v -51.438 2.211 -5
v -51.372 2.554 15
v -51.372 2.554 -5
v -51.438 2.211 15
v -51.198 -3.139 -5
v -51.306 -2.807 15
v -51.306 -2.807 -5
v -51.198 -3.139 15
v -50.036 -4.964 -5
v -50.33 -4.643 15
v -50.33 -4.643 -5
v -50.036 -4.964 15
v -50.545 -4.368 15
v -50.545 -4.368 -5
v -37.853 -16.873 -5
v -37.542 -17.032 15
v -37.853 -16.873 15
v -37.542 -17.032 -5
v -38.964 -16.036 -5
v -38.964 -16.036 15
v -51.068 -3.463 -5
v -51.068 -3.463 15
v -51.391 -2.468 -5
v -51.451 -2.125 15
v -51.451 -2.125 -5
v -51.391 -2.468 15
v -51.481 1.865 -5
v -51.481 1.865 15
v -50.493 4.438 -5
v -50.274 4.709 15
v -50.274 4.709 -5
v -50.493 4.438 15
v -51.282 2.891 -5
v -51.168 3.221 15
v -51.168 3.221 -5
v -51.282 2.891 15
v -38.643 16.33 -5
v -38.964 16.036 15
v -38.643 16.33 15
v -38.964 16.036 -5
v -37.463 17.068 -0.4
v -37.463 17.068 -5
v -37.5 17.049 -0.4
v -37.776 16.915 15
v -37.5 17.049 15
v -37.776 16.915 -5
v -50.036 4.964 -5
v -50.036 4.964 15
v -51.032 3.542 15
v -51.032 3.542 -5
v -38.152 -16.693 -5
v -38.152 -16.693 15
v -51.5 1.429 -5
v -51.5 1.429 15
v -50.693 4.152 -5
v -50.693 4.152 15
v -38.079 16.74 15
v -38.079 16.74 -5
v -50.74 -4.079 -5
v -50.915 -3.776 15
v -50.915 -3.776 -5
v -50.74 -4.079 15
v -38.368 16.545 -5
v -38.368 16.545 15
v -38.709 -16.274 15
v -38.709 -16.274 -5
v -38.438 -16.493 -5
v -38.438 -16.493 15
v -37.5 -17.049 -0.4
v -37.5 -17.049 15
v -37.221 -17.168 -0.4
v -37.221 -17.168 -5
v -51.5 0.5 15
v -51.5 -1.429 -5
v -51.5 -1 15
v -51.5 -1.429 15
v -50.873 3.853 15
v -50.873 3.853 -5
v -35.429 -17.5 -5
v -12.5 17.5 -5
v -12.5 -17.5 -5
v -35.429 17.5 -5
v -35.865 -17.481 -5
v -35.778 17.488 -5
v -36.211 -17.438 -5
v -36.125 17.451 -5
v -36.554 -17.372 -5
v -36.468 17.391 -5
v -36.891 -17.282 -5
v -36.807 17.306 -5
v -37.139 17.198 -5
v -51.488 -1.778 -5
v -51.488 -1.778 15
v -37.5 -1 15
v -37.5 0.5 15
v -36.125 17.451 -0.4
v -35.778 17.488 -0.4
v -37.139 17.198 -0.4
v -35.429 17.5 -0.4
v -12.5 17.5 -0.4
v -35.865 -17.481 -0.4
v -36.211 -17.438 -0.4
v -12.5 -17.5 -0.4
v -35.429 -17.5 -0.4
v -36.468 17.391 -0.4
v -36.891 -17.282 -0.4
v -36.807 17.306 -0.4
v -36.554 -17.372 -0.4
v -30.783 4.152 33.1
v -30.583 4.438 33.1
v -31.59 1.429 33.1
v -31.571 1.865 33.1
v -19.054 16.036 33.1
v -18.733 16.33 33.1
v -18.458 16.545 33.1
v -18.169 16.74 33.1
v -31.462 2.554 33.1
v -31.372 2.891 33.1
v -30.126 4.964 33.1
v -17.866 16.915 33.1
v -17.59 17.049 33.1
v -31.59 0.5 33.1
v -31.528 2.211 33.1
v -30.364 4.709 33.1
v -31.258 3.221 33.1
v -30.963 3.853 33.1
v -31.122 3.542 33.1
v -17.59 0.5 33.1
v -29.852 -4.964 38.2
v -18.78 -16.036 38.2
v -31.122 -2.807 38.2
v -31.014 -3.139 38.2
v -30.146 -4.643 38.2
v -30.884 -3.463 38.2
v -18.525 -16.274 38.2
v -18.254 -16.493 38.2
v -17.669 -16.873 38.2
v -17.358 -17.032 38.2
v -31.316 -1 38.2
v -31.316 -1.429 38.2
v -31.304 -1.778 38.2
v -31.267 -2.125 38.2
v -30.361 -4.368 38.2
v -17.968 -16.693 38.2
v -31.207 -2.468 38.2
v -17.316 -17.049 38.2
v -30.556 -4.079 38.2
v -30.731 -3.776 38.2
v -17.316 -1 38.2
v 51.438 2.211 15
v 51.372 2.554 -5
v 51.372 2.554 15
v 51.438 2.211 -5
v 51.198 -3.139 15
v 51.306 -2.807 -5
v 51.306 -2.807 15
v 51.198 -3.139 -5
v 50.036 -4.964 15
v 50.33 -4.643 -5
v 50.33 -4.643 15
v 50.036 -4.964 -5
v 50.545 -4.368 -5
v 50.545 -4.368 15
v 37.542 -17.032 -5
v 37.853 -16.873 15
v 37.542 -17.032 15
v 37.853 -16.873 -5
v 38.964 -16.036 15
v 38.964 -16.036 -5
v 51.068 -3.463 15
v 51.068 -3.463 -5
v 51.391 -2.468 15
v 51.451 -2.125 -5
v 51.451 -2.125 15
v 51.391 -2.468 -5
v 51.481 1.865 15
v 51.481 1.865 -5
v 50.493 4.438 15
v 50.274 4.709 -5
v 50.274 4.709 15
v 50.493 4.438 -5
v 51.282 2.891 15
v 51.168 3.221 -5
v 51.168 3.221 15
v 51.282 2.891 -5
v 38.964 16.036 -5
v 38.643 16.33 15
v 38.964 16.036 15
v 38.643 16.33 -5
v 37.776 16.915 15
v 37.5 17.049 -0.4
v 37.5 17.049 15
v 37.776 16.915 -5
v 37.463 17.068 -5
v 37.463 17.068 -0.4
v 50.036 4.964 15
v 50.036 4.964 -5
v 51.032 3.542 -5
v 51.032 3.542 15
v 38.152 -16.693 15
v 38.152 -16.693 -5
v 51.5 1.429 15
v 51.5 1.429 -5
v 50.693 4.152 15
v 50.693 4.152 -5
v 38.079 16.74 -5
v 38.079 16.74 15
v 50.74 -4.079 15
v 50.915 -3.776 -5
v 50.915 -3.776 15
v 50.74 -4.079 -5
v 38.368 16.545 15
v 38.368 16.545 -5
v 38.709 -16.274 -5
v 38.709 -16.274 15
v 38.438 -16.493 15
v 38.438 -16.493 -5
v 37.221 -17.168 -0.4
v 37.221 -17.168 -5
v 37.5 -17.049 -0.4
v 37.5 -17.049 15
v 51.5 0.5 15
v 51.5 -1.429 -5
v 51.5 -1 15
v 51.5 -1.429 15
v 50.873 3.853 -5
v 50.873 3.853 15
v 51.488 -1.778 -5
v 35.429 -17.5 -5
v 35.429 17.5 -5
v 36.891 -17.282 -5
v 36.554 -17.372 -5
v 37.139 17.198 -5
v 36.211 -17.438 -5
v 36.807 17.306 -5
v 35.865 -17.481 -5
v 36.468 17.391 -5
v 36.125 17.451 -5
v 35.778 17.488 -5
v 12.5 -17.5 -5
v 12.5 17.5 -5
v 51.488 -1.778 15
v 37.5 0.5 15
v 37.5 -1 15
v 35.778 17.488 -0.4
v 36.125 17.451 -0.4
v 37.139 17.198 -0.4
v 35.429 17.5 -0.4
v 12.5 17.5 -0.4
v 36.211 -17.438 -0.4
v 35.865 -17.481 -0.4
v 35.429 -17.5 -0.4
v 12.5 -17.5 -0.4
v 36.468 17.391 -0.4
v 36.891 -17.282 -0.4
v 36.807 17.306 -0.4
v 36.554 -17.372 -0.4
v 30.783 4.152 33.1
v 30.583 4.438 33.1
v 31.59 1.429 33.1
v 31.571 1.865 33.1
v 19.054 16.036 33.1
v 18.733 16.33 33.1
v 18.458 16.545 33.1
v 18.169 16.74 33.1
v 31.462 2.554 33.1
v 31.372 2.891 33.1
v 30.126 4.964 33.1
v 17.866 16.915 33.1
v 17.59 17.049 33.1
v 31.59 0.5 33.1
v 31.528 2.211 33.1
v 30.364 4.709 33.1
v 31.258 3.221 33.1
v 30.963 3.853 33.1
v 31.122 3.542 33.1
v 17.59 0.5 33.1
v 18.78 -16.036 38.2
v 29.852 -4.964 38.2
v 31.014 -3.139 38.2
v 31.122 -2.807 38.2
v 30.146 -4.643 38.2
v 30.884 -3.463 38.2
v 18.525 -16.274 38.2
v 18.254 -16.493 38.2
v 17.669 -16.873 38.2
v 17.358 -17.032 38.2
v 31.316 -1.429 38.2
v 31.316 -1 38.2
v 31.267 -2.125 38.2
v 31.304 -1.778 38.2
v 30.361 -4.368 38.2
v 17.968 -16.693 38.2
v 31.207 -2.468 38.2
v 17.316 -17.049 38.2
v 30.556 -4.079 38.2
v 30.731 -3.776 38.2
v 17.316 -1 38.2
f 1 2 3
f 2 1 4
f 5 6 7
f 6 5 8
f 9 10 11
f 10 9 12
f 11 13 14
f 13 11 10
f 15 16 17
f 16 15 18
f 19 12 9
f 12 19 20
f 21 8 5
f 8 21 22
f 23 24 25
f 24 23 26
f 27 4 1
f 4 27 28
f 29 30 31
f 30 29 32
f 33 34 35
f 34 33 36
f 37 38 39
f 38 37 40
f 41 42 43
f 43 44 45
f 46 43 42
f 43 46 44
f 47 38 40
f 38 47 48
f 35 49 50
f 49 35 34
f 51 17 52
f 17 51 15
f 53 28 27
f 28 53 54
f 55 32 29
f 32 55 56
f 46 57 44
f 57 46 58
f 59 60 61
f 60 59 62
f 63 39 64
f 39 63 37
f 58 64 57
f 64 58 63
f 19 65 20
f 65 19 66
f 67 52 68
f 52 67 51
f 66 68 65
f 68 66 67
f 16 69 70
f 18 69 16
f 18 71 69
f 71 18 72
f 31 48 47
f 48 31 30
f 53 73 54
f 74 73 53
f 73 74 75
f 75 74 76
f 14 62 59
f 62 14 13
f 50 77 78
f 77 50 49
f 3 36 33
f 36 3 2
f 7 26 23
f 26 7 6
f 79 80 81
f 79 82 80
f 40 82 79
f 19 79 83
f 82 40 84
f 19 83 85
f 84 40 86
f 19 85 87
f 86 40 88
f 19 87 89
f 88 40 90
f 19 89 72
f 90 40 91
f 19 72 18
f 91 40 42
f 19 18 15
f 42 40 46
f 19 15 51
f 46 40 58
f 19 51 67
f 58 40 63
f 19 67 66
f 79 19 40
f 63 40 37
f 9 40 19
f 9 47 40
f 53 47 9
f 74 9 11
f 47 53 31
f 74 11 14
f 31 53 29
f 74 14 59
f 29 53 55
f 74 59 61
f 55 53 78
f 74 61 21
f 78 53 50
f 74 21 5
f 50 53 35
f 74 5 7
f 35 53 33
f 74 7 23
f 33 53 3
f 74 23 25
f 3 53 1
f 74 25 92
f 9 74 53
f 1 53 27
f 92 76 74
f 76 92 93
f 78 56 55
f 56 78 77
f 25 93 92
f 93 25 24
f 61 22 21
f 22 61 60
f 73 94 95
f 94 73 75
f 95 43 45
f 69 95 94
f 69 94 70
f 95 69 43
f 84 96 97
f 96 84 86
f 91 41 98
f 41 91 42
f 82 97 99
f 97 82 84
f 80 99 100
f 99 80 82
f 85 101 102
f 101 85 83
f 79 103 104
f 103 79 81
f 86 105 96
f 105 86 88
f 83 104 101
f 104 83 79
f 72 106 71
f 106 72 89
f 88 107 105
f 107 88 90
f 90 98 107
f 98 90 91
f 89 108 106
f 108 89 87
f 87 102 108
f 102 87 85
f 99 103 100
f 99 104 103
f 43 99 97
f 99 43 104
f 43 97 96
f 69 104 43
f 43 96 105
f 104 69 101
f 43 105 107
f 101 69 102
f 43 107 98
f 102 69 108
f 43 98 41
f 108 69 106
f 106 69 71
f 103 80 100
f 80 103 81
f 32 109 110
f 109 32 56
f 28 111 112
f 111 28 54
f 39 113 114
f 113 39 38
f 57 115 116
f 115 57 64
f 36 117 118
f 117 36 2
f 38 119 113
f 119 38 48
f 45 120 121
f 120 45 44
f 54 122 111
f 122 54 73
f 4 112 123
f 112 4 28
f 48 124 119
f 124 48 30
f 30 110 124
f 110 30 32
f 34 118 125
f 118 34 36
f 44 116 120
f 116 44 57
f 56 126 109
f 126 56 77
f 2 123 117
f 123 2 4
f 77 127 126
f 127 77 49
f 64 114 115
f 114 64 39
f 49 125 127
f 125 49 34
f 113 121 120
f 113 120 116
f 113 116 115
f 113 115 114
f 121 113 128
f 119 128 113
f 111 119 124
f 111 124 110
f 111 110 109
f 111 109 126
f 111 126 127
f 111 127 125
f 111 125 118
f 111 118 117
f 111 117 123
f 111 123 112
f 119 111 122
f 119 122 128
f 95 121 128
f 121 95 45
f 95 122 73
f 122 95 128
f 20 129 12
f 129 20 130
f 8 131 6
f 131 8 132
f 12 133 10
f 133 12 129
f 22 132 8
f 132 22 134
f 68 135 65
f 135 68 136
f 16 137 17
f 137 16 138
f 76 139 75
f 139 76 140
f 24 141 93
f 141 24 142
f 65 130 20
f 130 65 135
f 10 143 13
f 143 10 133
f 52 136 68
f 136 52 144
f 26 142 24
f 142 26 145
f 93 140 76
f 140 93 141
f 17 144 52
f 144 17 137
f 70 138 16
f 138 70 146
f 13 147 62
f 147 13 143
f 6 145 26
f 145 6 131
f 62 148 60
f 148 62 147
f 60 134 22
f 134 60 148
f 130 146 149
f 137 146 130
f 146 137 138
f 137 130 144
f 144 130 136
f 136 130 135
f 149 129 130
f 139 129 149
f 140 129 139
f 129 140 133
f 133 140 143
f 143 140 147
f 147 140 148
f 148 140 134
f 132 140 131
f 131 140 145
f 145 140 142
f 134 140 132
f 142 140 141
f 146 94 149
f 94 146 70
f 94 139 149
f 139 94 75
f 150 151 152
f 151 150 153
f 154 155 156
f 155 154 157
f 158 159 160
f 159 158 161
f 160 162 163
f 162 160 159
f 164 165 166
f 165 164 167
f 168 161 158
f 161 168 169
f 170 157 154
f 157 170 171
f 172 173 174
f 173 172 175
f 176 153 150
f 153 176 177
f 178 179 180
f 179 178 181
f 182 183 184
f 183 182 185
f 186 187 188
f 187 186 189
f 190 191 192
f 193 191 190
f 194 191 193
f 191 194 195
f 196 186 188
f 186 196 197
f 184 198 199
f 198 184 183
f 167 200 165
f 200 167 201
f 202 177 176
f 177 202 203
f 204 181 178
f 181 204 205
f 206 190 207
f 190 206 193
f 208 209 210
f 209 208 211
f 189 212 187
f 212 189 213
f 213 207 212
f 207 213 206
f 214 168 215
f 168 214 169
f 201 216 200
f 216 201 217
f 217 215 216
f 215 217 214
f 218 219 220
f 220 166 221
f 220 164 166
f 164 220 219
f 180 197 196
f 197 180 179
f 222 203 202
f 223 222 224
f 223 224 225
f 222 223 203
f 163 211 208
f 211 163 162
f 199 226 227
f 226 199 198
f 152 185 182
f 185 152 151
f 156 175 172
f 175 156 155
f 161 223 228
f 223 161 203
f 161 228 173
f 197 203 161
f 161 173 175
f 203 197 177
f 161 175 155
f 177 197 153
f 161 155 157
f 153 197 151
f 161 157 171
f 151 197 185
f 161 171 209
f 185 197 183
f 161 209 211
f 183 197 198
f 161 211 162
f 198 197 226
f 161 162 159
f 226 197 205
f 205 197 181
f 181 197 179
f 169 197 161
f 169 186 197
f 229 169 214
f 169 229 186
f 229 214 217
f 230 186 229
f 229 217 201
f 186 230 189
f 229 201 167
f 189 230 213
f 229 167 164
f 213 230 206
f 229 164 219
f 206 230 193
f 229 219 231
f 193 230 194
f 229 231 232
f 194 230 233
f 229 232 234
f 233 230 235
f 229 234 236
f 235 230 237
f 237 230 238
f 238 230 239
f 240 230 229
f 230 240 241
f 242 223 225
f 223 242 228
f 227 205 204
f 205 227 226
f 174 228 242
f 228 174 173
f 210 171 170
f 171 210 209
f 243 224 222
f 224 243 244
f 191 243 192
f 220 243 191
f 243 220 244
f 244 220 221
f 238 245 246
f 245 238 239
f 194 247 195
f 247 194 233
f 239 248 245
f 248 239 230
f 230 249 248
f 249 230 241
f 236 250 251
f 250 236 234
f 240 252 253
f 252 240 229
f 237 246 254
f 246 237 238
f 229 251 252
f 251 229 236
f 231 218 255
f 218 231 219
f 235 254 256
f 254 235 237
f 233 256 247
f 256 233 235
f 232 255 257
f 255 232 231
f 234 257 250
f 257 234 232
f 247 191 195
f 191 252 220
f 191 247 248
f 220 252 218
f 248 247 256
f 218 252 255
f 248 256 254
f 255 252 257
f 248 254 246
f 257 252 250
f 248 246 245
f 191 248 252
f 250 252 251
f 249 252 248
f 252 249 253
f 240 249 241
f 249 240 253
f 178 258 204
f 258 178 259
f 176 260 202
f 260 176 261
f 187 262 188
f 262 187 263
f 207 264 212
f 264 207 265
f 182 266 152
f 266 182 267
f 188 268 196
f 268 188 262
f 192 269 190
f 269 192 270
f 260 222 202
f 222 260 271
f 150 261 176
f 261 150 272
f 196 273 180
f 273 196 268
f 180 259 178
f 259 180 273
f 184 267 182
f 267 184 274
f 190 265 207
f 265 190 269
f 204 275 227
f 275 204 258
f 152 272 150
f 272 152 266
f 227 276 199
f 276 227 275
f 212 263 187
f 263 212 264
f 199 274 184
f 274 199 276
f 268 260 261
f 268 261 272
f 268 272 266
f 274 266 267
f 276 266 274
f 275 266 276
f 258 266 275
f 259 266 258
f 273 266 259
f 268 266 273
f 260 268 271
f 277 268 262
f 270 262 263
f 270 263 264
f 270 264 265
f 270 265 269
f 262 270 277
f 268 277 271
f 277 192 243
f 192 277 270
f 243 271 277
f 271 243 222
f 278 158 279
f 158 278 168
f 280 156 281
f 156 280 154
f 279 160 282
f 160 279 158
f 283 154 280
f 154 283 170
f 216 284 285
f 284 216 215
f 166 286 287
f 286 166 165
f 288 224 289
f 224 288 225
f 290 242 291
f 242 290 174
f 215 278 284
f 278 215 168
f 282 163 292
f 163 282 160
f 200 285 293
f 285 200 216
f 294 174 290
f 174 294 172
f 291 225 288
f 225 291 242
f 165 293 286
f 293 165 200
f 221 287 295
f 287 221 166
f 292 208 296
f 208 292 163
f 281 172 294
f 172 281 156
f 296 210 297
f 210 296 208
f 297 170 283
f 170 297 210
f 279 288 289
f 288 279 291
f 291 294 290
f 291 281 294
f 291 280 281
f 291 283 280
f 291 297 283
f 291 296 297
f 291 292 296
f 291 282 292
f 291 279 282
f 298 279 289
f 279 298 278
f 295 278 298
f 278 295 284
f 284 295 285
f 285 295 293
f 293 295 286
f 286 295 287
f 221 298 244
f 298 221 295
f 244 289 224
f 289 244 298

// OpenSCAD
// OpenSCAD file for hypercube parts.
// Copyright by Piotr Stachura <pstachura2012@gmail.com>

// M3 nut: head: 5.4mm, rod: 2.93mm
// M3 square: 5.44x1.7
// M3 hexagon: 5.44, 6.2x2.46

square_nut_add = 0.4;

//%import("Y_Carriage_xDia8_LM10UU_1.0.stl");

$fn=90;

module support_low() {
   translate([0,0,-5])
   multmatrix(m = [[1, 0, 0, -20],
                   [0, 1, 0, 0],
                   [0, 0, 1, 0],
                   [0, 0, 0, 1]]) difference() {
      linear_extrude(20) offset(r=5) offset(r=-5)
         polygon([[-17.5,-17.5],[17.5,-17.5],[31.5,-3.5],[31.5,3.5],
                  [17.5,17.5],[-17.5,17.5],[-31.5,3.5],[-31.5,-3.5]]);
      translate([-17.5,-35,-1]) cube([60,70,100],false);
   }
   difference() {
      translate([-20,0,-5]) linear_extrude(4.6) offset(r=5) offset(r=-5)
         polygon([[-17.5,-17.5],[17.5,-17.5],[31.5,-3.5],[31.5,3.5],
                  [17.5,17.5],[-17.5,17.5],[-31.5,3.5],[-31.5,-3.5]]);
      translate([-12.5,-35,-6]) cube([60,70,100],false);
   }
}

module support_high1() {
   multmatrix(m = [[1, 0, 1.1, -20],
                   [0, 1, 0, 0],
                   [0, 0, 1, 15],
                   [0, 0, 0, 1]]) difference() {
      linear_extrude(18.5-0.4) offset(r=5) offset(r=-5)
         polygon([[-17.5,-17.5],[17.5,-17.5],[31.5,-3.5],[31.5,3.5],
                  [17.5,17.5],[-17.5,17.5],[-31.5,3.5],[-31.5,-3.5]]);
      translate([-17.5,-35,-1]) cube([60,70,100],false);
      translate([-50,-69.5,-1]) cube([60,70,100],false);
   }
}

module support_high2() {
   multmatrix(m = [[1, 0, 0.87, -20],
                   [0, 1, 0, 0],
                   [0, 0, 1, 15],
                   [0, 0, 0, 1]]) difference() {
      linear_extrude(23.6-0.4) offset(r=5) offset(r=-5)
         polygon([[-17.5,-17.5],[17.5,-17.5],[31.5,-3.5],[31.5,3.5],
                  [17.5,17.5],[-17.5,17.5],[-31.5,3.5],[-31.5,-3.5]]);
      translate([-17.5,-35,-1]) cube([60,70,100],false);
      translate([-50,-1,-1]) cube([60,70,100],false);
   }
}

module y_carriage_base() {
   difference() {
      union() {
         // body
        rotate([90,0,0]) cylinder(d=23,h=35,center=true);
         difference() {
            linear_extrude(45) offset(r=5) offset(r=-5)
               polygon([[-17.5,-17.5],[17.5,-17.5],[31.5,-3.5],[31.5,3.5],
                  [17.5,17.5],[-17.5,17.5],[-31.5,3.5],[-31.5,-3.5]]);
            translate([0,0,18]) linear_extrude(45-18-6.5-5) offset(r=5.5) offset(r=-5)
               polygon([[-17.5,-17.5],[17.5,-17.5],[31.5,-3.5],[31.5,3.5],
                  [17.5,17.5],[-17.5,17.5],[-31.5,3.5],[-31.5,-3.5]]);
            translate([0,0,18]) linear_extrude(45-18-6.5) offset(r=5.5) offset(r=-5)
               polygon([[-40,-17.5],[40,-17.5],[40,0],[-40,0]]);
            translate([0,0,-0.1]) linear_extrude(46)
               polygon([[11.5,17.51],[18.25,17.51],[18.25,9.85],
                  [24,4.1],[21.9,4.1],[16.5,9.5],[11.5,9.5]]);
            mirror([1,0,0]) translate([0,0,-0.1]) linear_extrude(46)
               polygon([[11.5,17.51],[18.25,17.51],[18.25,9.85],
                  [24,4.1],[21.9,4.1],[16.5,9.5],[11.5,9.5]]);
         }
         translate([0,0,0]) linear_extrude(45) offset(r=2) offset(r=-2)
            polygon([[-12.5,-17.5],[12.5,-17.5],[16.5,-13.5],[16.5,17.5],[-16.5,17.5],[-16.5,-13.5]]);
      }
      // low cut
      translate([0,0,-10-5]) cube([100,100,20],true);
      // y belt
      translate([-5.5,0,15.25]) cube([9,40,5.5],true);
      // y rail
      rotate([0,0,90]) for(y=[0]) {
         translate([-28,y,0]) rotate([0,90,0]) cylinder(d=19.2-0.6,h=56,center=false);
         translate([-28,y,0]) rotate([0,90,0]) cylinder(d=19.2,h=17.3,center=false);
         translate([-9.9,y,0]) rotate([0,90,0]) cylinder(d=19.2,h=19.8,center=false);
         translate([10.7,y,0]) rotate([0,90,0]) cylinder(d=19.2,h=17.3,center=false);
      }
//      translate([0,0,-0.5]) rotate([90,0,0]) cylinder(d=20,h=40,center=true);
      // x rails
      for(x_pos = [-22.5,22.5]) {
         translate([x_pos,0,0]) cylinder(d=10.2,h=100,center=true);
      }
      // xy belt1
      intersection() {
         translate([-11,0,0]) rotate([-90,180,-90]) linear_extrude(12)
            offset(r=9.75) offset(r=-9.75)
               polygon([[-30,25.25],[3.6,25.25],[3.6,100],[-30,100]]);
         union() {
            translate([-11,-30,25.25]) cube([11,34,30],false);
            translate([-0.1,-10.45,31]) cube([0.9,34,30],false);
            translate([-0.1,-3.65,25.25]) cube([0.9,10,30],false);
         }
      }
      // xy belt2
      intersection() {
         translate([0,0,0]) rotate([-90,180,-90]) linear_extrude(11)
            offset(r=9.75) offset(r=-9.75)
               polygon([[-3.65,12.5],[40,12.5],[40,100],[-3.65,100]]);
         union() {
            translate([0,-3.65,12.5]) cube([11,7.25,40],false);
            translate([0,-3.65,12.5]) cube([11,30,20],false);
         }
      }
   }
}

module xy_belt_mount() {
   cylinder(d=6.2,h=3.1,center=false);
   cylinder(d=3.5,h=100,center=false);
   translate([0,0,28.1]) cylinder(d=4.5,h=10,center=false);
}

module x_belt_mount() {
   cylinder(d=6.2,h=3.1,center=false);
   cylinder(d=3.5,h=14,center=false);
   translate([0,0,9]) rotate([0,0,45]) cylinder(d=(5.44+square_nut_add)*1.41,h=2.2,center=false,$fn=4);
   translate([-(5.44+square_nut_add)/2,-(5.44+square_nut_add)/2,9])
      cube([20,5.44+square_nut_add,2.2],false);
}

module y_rail_mount() {
   cylinder(d=3.5,h=10,center=false);
   translate([0,0,4]) rotate([0,0,45]) cylinder(d=(5.44+square_nut_add)*1.41,h=2.1,center=false,$fn=4);
   translate([-(5.44+square_nut_add)/2,-(5.44+square_nut_add)/2,4])
      cube([5.44+square_nut_add,20,2.1],false);
   translate([0,0,6.1+0.1-0.01]) cube([5.44+square_nut_add,3.5,0.22],true);
   translate([0,0,6.1+0.3-0.01]) cube([3.5,3.5,0.22],true);
}

module y_carriage_scad() {
   difference() {
      union() {
         y_carriage_base();
         // xy belt1 positioner
         translate([-11.1,-6.365,35.23]) rotate([0,90,0])
            cylinder(d1=5.6,d2=4.6,h=0.9,center=false);
         // xy belt2 positioners
         translate([-0.1,6.365,22.5]) rotate([0,90,0])
            cylinder(d1=5.6,d2=4.6,h=0.9,center=false);
         translate([11.1,6.365,22.5]) rotate([0,-90,0])
            cylinder(d1=5.6,d2=4.6,h=0.9,center=false);
      }
      // xy belt1 mount
      translate([-16.6,-6.365,35.23]) rotate([0,90,0]) xy_belt_mount();
      // xy belt2 mount
      translate([16.6,6.365,22.5]) rotate([0,-90,0]) xy_belt_mount();
      // x belt2 mount
      rotate([0,-90,45]) translate([13,-7,-24.85]) rotate([0,0,180]) x_belt_mount();
      rotate([0,-90,45]) translate([40,-7,-24.85]) x_belt_mount();
      // x belt1 mount
      mirror([1,0,0]) rotate([0,-90,45]) translate([13,-7,-24.85]) rotate([0,0,180])  x_belt_mount();
      mirror([1,0,0]) rotate([0,-90,45]) translate([40,-7,-24.85]) x_belt_mount();
   }
}   

module supports() {
   support_low();
   support_high1();
   support_high2();
}

//y_carriage_scad();
supports();
mirror([1,0,0]) supports();

// Revision history:
// 2020-04-08: Initial revision - re-creation from STL
// 2020-04-08: Modify part to include square nuts inside (need print pause)
// 2020-04-09: Add additional rail mount. Move down screw up to help with 3030 profile collision.
// 2020-04-20: Update sizes for better fit of screws. Add custom supports.
